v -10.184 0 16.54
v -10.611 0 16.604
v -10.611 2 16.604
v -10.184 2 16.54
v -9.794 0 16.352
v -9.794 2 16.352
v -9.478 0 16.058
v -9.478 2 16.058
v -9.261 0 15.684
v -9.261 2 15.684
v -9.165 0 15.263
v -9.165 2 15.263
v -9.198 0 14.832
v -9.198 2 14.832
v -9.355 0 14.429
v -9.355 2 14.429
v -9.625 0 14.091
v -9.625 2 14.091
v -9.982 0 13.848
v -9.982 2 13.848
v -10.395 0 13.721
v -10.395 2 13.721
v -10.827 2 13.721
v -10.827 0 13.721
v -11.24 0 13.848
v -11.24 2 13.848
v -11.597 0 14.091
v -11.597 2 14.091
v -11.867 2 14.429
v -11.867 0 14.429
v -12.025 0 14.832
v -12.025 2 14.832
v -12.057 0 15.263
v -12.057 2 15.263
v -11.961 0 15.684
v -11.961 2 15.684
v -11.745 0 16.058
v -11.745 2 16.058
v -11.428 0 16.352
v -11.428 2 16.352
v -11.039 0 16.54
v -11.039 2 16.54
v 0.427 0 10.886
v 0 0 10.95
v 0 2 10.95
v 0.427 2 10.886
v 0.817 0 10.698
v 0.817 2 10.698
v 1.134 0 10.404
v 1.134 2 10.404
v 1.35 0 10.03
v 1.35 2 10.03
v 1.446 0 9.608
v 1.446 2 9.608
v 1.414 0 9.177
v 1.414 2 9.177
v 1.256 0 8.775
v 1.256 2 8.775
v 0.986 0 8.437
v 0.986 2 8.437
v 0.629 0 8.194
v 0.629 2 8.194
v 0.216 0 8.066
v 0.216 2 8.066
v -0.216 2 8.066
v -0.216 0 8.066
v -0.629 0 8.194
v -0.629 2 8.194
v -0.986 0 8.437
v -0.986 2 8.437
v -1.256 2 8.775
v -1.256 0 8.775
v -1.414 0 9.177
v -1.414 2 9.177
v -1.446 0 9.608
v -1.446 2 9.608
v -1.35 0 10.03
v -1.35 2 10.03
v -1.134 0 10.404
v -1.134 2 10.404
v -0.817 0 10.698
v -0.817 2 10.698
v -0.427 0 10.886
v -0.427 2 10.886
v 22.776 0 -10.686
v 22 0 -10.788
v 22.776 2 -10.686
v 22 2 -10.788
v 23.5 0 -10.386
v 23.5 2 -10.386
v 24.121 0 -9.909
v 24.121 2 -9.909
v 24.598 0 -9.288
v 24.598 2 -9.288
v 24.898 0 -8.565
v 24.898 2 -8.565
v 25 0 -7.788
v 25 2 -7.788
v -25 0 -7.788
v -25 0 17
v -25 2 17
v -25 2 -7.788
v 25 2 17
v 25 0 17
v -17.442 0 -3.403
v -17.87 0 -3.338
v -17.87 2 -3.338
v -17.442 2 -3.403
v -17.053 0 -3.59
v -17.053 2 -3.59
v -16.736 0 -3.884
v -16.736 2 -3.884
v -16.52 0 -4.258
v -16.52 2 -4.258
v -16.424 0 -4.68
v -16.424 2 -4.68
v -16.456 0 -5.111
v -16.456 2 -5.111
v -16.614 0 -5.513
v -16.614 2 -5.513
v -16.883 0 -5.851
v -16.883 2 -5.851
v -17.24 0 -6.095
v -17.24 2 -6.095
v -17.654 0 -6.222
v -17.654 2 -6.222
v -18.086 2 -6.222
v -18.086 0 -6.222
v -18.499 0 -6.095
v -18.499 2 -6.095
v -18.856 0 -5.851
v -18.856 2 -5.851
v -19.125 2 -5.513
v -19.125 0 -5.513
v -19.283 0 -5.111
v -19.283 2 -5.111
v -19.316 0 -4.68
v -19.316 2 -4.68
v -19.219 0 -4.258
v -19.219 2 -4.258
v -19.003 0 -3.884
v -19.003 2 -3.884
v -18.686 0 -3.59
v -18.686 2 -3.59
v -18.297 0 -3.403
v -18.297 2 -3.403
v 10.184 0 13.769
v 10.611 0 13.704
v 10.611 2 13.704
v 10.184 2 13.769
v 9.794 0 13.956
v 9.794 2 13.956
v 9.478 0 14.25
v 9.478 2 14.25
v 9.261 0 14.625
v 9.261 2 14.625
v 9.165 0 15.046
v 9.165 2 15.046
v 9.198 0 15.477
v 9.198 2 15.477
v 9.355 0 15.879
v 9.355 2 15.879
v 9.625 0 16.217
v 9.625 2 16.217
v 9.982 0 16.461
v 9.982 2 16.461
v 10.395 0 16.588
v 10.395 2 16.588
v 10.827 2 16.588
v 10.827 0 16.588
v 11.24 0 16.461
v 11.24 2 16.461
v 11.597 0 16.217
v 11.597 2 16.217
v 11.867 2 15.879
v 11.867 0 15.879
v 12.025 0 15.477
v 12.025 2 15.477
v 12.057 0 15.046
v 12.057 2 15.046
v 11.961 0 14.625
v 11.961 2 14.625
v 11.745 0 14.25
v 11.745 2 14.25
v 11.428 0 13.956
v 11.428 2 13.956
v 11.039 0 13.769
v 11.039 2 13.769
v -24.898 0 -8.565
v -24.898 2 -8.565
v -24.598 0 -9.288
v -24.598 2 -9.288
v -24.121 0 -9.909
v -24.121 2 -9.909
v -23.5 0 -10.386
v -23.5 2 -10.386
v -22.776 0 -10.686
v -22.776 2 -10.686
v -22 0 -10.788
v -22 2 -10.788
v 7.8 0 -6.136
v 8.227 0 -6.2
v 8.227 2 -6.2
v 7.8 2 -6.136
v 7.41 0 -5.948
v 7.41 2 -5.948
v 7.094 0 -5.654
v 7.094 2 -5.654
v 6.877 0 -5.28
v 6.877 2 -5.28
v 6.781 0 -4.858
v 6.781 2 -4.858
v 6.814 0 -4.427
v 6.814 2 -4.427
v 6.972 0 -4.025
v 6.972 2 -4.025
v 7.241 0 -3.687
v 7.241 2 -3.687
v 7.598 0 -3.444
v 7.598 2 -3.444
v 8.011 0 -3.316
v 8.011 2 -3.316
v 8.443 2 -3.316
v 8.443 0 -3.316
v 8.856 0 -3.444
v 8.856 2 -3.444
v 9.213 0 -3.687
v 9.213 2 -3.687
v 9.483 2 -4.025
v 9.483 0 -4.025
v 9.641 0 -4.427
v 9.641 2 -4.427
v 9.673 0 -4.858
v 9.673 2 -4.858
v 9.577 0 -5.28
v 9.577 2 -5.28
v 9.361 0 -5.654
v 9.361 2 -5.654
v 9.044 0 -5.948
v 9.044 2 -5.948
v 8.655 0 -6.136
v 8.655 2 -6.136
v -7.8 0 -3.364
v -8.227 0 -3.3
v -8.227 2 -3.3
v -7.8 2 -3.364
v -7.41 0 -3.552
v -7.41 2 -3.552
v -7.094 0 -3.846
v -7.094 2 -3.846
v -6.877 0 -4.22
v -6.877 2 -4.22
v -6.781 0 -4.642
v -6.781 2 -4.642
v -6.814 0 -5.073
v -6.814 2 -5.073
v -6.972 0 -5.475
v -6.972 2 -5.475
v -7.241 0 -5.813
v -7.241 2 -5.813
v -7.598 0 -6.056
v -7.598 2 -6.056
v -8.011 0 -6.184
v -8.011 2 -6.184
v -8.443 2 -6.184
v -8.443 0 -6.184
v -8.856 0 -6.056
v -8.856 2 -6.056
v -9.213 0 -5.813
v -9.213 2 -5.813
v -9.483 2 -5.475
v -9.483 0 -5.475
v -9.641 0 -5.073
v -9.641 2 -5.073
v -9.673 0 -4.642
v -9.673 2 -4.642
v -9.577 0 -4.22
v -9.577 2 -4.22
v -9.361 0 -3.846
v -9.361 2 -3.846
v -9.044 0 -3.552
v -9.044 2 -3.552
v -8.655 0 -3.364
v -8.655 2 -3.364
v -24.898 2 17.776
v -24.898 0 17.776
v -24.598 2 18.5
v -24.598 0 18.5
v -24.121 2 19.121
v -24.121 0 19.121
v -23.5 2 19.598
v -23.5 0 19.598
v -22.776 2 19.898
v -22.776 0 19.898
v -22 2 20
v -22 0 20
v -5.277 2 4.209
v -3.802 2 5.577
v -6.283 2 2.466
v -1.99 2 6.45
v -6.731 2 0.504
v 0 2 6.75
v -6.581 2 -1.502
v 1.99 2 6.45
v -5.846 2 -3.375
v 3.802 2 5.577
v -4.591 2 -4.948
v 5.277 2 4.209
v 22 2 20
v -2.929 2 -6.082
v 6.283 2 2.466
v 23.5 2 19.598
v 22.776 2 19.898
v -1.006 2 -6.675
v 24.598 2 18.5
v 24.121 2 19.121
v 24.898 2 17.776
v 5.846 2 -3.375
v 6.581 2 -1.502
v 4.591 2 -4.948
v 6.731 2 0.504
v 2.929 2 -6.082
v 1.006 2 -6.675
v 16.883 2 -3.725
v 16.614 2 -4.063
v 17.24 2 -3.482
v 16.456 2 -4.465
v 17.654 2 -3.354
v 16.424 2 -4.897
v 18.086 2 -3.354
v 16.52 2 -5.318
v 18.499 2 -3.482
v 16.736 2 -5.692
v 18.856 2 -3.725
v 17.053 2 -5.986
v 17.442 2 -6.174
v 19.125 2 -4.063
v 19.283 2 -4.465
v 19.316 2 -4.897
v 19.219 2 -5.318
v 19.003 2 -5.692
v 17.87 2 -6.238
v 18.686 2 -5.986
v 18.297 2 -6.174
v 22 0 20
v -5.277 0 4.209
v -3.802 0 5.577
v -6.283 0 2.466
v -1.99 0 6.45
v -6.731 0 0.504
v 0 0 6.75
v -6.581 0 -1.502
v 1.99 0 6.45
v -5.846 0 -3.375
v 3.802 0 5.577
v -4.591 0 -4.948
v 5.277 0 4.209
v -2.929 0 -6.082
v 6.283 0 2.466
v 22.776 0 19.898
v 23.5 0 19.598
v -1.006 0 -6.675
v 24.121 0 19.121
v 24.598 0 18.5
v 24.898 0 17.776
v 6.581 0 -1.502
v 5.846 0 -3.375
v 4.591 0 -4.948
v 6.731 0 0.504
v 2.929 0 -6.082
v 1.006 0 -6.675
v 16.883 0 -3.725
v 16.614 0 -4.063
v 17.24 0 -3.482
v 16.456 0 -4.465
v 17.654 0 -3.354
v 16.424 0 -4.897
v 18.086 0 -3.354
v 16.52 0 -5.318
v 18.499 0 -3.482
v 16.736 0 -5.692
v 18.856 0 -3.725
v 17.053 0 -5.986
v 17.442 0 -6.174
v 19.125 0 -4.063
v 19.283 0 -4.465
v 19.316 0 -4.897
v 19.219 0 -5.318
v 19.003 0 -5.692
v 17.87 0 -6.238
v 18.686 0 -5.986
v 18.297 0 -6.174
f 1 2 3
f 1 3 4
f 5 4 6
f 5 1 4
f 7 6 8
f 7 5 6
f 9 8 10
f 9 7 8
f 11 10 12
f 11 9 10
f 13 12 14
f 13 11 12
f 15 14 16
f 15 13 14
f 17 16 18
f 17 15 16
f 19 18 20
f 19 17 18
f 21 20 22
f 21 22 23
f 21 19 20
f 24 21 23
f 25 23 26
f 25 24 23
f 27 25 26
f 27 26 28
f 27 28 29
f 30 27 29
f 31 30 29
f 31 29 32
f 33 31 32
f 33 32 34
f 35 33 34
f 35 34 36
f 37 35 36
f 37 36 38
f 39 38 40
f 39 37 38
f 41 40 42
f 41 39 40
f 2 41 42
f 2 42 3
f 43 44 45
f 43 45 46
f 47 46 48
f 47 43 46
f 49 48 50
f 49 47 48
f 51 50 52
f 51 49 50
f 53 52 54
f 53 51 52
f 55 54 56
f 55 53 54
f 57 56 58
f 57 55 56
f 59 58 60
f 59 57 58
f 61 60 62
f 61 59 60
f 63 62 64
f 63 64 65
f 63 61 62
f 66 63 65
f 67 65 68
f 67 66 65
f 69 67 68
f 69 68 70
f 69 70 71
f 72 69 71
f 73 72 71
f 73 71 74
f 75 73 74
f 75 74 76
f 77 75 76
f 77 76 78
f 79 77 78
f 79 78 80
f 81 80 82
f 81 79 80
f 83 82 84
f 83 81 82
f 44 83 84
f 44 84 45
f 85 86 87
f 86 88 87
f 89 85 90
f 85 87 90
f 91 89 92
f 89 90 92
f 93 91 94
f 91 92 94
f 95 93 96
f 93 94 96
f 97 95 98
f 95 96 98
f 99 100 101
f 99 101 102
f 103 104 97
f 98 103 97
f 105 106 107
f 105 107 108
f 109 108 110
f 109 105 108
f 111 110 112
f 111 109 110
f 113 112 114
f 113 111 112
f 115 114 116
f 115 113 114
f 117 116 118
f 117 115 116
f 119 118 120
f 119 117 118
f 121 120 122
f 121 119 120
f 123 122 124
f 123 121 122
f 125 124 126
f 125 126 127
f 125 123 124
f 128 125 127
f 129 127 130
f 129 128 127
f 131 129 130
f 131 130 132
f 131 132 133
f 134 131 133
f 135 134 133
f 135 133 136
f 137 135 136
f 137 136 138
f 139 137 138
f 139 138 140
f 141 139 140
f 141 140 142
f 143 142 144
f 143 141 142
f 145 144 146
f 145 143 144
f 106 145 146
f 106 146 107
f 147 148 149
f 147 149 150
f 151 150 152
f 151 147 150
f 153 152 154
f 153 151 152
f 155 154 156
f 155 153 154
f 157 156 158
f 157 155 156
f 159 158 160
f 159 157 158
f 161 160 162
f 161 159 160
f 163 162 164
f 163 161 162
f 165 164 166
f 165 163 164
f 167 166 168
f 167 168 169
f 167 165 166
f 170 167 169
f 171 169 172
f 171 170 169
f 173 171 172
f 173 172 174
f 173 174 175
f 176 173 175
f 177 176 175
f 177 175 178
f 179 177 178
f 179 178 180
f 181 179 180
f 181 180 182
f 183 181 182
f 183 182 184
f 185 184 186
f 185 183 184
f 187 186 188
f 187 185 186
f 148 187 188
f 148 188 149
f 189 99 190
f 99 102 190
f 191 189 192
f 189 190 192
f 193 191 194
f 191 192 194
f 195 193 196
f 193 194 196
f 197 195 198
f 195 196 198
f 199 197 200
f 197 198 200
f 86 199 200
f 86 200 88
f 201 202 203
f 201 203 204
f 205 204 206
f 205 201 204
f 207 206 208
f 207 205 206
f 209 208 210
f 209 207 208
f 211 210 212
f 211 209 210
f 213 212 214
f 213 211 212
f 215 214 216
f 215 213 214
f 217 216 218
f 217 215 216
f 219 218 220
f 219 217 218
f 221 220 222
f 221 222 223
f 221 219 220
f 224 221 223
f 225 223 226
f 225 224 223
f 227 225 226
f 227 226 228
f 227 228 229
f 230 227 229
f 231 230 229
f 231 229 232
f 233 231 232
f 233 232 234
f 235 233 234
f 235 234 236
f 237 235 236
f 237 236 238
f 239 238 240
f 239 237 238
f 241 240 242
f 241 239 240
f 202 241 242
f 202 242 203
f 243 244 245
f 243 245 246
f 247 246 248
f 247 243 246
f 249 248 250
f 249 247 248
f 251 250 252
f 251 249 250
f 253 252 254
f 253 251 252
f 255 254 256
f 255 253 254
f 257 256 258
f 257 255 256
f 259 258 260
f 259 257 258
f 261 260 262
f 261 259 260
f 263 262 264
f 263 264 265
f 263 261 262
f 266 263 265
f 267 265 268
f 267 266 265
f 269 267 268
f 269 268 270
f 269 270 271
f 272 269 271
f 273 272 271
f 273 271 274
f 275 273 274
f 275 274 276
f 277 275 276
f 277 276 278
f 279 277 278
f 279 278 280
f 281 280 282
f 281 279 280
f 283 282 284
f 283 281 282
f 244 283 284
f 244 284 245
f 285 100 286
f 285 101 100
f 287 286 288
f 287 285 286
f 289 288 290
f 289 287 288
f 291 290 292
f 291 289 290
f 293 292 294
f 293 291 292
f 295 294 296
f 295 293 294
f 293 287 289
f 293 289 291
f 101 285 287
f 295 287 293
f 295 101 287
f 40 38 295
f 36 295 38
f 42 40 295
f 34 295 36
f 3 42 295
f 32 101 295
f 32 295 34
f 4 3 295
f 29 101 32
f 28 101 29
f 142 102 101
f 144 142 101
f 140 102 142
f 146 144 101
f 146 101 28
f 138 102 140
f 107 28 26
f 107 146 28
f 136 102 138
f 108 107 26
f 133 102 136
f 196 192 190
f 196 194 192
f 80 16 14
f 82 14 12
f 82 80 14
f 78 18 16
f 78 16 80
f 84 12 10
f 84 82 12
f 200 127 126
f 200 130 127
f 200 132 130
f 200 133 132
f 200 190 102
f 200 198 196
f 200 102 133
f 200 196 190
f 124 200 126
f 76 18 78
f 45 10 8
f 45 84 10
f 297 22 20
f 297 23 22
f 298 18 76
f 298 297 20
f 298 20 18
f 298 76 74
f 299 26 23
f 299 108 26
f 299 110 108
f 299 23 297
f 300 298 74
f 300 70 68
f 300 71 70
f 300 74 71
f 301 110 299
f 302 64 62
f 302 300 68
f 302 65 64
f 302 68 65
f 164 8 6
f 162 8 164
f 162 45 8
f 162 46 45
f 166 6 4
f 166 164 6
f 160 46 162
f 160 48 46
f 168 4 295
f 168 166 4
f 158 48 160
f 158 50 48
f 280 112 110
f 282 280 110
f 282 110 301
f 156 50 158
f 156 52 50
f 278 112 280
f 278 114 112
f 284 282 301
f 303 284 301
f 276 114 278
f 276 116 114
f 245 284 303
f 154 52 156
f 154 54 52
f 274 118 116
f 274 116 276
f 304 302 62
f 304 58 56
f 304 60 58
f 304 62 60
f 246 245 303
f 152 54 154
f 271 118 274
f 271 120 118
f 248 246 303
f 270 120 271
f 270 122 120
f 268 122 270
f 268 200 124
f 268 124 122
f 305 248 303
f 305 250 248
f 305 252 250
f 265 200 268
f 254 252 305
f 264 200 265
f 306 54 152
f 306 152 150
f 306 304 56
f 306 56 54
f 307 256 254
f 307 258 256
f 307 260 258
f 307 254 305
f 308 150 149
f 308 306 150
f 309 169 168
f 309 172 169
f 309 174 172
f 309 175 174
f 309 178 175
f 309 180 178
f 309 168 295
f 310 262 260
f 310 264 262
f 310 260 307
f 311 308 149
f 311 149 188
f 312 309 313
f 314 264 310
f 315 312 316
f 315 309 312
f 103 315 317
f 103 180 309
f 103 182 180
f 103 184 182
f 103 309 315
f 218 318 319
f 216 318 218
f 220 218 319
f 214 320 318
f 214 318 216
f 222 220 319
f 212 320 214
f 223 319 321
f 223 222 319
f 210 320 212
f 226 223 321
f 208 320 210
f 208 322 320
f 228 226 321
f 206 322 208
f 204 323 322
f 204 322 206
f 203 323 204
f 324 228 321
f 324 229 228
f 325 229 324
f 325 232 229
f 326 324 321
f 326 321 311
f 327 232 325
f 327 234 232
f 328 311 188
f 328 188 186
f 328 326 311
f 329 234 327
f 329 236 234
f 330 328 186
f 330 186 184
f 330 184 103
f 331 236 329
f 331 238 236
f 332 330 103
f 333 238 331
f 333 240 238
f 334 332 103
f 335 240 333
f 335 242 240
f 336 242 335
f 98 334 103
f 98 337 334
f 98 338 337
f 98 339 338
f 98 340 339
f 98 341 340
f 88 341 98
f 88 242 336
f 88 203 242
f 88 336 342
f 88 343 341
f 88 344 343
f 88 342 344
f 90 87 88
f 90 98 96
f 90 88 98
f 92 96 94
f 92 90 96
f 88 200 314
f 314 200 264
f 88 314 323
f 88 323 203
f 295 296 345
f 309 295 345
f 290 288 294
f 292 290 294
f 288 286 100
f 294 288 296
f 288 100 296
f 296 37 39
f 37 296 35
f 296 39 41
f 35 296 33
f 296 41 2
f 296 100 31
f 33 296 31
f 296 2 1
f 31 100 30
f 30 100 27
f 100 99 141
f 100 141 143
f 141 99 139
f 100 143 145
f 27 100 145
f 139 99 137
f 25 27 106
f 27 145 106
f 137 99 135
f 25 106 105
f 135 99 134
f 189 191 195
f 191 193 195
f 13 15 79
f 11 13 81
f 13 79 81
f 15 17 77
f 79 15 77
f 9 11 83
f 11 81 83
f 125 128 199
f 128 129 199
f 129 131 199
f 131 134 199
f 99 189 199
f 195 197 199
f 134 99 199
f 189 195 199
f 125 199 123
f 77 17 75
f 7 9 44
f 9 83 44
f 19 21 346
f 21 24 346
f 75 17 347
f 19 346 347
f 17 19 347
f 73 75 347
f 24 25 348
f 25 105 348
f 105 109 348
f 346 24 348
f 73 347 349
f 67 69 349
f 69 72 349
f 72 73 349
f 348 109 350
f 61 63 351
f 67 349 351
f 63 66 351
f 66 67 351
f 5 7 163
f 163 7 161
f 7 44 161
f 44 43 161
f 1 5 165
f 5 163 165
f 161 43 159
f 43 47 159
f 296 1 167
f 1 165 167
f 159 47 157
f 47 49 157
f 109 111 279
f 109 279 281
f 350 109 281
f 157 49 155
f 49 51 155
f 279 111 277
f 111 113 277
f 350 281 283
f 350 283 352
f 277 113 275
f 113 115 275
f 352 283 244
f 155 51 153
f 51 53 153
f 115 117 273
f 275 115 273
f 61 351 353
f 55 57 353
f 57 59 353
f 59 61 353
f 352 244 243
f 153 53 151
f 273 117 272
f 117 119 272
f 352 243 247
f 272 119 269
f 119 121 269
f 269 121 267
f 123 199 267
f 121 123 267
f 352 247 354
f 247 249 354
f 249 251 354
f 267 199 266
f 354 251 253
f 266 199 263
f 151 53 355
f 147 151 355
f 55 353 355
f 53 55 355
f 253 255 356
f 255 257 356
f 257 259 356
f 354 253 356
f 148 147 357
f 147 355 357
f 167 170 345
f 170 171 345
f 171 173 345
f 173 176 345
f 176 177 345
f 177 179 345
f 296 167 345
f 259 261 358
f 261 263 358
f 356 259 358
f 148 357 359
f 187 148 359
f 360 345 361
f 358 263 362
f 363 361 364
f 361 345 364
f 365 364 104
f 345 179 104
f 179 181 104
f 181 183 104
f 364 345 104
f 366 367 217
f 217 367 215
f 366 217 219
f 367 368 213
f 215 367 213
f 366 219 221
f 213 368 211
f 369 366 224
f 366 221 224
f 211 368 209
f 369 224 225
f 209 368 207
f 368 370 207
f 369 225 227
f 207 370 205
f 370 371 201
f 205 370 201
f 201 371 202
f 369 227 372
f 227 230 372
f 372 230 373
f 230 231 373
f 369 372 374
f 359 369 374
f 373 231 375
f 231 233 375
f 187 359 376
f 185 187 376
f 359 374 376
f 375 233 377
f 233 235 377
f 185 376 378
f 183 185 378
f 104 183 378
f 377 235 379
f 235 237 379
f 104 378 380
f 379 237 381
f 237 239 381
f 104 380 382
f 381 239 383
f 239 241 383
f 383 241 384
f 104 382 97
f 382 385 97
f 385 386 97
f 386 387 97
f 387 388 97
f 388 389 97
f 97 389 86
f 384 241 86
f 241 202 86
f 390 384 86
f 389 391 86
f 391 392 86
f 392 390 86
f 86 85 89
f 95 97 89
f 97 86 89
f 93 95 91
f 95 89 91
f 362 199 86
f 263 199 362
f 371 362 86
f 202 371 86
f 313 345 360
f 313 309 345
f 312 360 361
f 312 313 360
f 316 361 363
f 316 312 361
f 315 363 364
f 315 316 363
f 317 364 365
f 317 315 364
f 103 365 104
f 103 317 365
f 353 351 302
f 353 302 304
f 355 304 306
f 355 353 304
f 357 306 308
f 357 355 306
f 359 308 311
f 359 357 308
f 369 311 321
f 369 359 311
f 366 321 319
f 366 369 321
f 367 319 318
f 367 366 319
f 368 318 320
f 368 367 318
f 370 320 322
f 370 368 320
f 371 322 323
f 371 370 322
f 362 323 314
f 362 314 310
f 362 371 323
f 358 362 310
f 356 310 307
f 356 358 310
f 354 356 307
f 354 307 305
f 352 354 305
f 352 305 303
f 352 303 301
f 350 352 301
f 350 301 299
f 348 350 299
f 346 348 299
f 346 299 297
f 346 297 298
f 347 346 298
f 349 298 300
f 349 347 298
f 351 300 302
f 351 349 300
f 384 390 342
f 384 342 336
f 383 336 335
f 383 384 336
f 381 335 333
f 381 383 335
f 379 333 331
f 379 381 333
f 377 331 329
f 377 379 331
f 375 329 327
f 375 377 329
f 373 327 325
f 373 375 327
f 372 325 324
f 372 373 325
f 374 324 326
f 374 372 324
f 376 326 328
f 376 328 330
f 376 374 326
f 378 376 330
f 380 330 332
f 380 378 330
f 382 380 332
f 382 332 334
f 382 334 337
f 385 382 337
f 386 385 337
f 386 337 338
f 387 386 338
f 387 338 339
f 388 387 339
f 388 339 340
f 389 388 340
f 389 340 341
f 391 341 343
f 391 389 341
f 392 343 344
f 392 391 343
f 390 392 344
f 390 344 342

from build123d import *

# Parameters (mm, degrees)
SKETCH_2_W      = 50
SKETCH_2_H      = 30.788152334
SKETCH_2_R      = 6.75
SKETCH_2_R_2    = 1.45
EXTRUDE_1_DEPTH = 2
FILLET_2_R      = 3


with BuildPart() as part:
    # 草图2 → 凸台-拉伸1 (new body)
    with BuildSketch(Plane(origin=(0, 0, 0), x_dir=(1, 0, 0), z_dir=(0, 1, 0))):
        with Locations((0, -4.605923833)):
            Rectangle(SKETCH_2_W, SKETCH_2_H)
        with Locations(Location((0, 0, 0), (0, 0, 270))):
            Circle(SKETCH_2_R, mode=Mode.SUBTRACT)
        with Locations(Location((-8.227241336, 4.75, 0), (0, 0, 270))):
            Circle(SKETCH_2_R_2, mode=Mode.SUBTRACT)
        with Locations(Location((0, -9.5, 0), (0, 0, 270))):
            Circle(SKETCH_2_R_2, mode=Mode.SUBTRACT)
        with Locations(Location((8.227241336, 4.75, 0), (0, 0, 90))):
            Circle(SKETCH_2_R_2, mode=Mode.SUBTRACT)
        with Locations(Location((-10.611164072, -15.154312819, 0), (0, 0, 270))):
            Circle(SKETCH_2_R_2, mode=Mode.SUBTRACT)
        with Locations(Location((-17.869627786, 4.788152334, 0), (0, 0, 270))):
            Circle(SKETCH_2_R_2, mode=Mode.SUBTRACT)
        with Locations(Location((10.611164072, -15.154312819, 0), (0, 0, 90))):
            Circle(SKETCH_2_R_2, mode=Mode.SUBTRACT)
        with Locations(Location((17.869627786, 4.788152334, 0), (0, 0, 90))):
            Circle(SKETCH_2_R_2, mode=Mode.SUBTRACT)
    extrude(amount=EXTRUDE_1_DEPTH)

    # 圆角2
    fillet_2_edges = [part.edges().sort_by_distance(p)[0] for p in [
        (25, 1, 20),
        (-25, 1, 20),
        (-25, 1, -10.788152334),
        (25, 1, -10.788152334),
    ]]
    fillet(fillet_2_edges, radius=FILLET_2_R)


solid = part.part
